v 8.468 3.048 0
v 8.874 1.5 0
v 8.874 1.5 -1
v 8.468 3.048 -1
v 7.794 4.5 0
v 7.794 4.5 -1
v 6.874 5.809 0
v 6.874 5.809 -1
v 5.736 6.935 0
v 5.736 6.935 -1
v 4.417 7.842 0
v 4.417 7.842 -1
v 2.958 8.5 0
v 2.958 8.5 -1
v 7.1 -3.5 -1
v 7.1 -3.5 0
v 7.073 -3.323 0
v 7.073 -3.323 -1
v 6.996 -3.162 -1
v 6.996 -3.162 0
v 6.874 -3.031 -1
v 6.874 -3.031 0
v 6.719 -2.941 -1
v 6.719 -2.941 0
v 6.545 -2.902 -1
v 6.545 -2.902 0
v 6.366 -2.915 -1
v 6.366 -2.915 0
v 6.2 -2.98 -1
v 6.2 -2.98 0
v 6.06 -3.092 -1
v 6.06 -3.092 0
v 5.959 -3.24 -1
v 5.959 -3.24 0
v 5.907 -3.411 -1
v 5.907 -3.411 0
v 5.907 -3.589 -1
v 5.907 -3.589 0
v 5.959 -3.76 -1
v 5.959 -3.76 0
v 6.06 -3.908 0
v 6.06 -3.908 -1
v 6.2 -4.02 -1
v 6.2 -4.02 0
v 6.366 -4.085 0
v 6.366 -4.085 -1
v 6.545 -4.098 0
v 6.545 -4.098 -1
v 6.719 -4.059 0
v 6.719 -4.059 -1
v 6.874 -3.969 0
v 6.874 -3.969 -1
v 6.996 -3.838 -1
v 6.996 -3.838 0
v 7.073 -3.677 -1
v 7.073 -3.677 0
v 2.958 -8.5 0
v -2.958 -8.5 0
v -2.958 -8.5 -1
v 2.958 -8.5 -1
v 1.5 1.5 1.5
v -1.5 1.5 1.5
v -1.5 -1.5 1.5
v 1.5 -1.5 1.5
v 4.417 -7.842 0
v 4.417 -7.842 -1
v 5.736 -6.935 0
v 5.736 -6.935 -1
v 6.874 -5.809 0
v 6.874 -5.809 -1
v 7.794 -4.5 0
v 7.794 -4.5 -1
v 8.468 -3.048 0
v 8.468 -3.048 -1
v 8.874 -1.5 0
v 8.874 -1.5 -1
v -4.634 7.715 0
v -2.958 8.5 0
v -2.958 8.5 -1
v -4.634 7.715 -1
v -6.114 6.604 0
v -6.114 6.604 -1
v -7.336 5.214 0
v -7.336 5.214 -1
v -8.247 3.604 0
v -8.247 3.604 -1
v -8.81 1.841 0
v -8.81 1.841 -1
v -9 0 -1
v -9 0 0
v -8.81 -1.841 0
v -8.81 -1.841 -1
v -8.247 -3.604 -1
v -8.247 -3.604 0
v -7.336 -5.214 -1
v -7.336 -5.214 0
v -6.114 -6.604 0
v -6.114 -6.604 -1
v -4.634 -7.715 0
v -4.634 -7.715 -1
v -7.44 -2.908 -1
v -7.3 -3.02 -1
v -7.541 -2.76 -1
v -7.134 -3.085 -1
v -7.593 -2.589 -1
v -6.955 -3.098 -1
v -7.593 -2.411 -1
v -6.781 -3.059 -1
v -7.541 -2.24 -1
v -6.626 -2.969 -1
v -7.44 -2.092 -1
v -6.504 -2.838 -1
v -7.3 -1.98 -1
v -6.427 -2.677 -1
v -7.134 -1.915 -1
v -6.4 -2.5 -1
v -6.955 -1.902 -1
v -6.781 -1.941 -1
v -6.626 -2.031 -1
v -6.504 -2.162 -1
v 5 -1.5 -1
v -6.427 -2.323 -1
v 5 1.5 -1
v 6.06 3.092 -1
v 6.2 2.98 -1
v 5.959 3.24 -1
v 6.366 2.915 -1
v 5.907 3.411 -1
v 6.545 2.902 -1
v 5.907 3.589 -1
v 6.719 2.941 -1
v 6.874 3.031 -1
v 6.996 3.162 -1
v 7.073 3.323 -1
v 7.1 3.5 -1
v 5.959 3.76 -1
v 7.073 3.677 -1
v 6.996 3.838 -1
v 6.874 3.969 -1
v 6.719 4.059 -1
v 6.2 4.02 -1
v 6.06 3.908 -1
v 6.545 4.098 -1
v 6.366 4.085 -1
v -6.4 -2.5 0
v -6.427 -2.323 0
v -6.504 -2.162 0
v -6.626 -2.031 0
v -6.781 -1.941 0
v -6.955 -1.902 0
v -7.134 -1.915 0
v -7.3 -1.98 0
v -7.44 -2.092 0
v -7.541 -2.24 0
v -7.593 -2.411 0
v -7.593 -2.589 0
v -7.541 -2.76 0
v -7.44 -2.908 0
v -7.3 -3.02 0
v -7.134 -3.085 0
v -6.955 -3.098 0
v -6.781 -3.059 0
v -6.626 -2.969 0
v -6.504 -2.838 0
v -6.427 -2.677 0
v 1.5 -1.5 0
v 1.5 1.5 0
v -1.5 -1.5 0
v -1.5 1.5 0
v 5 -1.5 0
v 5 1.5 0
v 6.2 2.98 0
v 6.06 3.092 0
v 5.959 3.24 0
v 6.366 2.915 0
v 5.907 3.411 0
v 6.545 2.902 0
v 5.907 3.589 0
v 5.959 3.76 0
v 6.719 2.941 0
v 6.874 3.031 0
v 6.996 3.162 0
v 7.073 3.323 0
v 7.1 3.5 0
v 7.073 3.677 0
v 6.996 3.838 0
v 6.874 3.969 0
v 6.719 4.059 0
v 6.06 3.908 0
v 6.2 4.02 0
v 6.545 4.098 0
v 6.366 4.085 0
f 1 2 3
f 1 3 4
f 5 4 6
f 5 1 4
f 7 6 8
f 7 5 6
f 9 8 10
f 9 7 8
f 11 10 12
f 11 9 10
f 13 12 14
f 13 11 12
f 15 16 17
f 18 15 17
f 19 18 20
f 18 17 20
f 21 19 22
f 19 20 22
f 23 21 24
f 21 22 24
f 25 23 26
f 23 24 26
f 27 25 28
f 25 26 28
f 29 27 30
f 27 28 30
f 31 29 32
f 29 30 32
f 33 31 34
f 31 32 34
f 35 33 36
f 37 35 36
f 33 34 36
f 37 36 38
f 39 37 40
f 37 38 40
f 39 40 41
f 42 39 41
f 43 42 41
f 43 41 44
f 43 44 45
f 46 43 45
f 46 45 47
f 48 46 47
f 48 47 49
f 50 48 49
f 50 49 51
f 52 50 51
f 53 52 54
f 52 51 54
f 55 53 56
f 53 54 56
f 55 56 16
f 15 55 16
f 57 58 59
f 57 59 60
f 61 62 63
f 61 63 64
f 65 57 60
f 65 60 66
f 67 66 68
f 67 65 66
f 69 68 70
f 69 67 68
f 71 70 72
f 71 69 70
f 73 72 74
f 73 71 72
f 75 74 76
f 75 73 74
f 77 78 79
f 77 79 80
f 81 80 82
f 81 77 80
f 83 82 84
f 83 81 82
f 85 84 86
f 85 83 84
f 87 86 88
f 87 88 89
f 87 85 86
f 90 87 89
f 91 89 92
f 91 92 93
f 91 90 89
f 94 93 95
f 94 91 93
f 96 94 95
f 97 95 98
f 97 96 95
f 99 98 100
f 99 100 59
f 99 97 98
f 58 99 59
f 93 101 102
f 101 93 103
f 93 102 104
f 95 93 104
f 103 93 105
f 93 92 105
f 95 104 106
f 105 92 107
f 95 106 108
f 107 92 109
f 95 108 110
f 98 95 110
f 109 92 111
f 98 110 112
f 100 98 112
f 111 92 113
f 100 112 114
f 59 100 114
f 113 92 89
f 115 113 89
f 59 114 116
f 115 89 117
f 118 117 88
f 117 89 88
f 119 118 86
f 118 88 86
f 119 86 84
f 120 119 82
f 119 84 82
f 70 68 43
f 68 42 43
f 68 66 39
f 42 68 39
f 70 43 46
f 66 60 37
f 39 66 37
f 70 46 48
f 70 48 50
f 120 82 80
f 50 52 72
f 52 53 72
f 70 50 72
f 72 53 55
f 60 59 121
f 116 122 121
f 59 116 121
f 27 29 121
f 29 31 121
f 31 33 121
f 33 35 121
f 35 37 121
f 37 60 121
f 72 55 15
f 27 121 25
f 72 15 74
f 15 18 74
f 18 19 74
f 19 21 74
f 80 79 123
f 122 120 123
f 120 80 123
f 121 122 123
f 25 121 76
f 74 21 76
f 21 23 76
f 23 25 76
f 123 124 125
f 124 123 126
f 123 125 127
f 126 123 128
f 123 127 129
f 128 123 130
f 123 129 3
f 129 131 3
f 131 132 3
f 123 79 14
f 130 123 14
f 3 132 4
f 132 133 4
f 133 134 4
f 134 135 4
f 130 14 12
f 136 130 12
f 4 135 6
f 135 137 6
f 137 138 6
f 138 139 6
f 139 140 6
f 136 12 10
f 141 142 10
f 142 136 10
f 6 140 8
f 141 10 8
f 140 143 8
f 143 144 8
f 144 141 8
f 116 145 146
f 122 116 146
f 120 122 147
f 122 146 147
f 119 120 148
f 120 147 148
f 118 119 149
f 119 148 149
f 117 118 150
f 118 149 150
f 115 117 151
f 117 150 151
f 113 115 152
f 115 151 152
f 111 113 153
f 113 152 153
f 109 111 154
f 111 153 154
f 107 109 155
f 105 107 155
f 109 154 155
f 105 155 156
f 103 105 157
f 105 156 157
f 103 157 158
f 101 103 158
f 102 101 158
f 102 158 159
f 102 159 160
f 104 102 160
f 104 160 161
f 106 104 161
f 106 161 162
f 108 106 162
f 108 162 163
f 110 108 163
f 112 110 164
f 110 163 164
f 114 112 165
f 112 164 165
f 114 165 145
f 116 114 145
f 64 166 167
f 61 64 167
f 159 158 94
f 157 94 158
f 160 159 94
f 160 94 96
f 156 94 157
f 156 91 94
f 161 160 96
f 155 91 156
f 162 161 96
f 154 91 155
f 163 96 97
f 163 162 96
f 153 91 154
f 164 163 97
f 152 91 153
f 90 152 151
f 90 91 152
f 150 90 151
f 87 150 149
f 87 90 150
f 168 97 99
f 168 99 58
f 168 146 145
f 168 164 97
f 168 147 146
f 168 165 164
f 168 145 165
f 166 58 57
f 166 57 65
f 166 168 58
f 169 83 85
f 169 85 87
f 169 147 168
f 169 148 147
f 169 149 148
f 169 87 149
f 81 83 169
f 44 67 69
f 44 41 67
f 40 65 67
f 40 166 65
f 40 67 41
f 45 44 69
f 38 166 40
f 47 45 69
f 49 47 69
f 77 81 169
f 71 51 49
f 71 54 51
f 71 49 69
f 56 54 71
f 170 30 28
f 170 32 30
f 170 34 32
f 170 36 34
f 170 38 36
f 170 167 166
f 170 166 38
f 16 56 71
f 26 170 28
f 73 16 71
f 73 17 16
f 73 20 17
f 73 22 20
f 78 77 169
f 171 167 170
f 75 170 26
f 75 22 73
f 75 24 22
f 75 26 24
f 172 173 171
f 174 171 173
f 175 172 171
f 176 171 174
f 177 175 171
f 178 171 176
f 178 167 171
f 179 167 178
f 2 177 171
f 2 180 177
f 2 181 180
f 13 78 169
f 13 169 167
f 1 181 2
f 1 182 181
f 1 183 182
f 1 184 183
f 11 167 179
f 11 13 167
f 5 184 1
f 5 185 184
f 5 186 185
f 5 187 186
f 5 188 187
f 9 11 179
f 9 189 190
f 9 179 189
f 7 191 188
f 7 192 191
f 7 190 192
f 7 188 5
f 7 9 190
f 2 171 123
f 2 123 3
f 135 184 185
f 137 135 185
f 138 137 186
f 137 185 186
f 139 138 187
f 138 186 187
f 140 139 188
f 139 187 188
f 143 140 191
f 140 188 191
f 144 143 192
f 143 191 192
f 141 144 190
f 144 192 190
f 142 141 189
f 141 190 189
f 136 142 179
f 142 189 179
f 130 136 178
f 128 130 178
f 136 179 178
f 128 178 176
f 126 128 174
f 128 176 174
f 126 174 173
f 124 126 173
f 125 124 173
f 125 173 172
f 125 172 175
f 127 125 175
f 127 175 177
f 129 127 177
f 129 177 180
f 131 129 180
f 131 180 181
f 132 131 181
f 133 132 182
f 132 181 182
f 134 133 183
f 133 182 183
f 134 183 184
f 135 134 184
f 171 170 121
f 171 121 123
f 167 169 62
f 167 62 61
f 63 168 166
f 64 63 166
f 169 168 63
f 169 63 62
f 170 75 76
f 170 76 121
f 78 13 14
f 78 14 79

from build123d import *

# Parameters (mm, degrees)
SKETCH_1_R      = 0.6
EXTRUDE_1_DEPTH = 1
SKETCH_1_3_W    = 3
SKETCH_1_3_H    = 3
EXTRUDE_2_DEPTH = 1.5


with BuildPart() as part:
    # Sketch 1 → Extrude 1 (new body)
    with BuildSketch(Plane.XY):
        with BuildLine():
            Line((5, -1.5), (5, 1.5))
            Line((5, 1.5), (8.874119675, 1.5))
            ThreePointArc((8.874119675, 1.5), (6.873863542, 5.809475019), (2.958039892, 8.5))
            Line((2.958039892, 8.5), (-2.958039892, 8.5))
            ThreePointArc((-2.958039892, 8.5), (-9, 0), (-2.958039892, -8.5))
            Line((-2.958039892, -8.5), (2.958039892, -8.5))
            ThreePointArc((2.958039892, -8.5), (6.873863542, -5.809475019), (8.874119675, -1.5))
            Line((8.874119675, -1.5), (5, -1.5))
        make_face()
        with Locations((-7, -2.5)):
            Circle(SKETCH_1_R, mode=Mode.SUBTRACT)
        with Locations((6.5, -3.5)):
            Circle(SKETCH_1_R, mode=Mode.SUBTRACT)
        with Locations((6.5, 3.5)):
            Circle(SKETCH_1_R, mode=Mode.SUBTRACT)
    extrude(amount=-EXTRUDE_1_DEPTH)

    # Sketch 1_3 → Extrude 2 (add)
    with BuildSketch(Plane.XY):
        Rectangle(SKETCH_1_3_W, SKETCH_1_3_H)
    extrude(amount=EXTRUDE_2_DEPTH)


solid = part.part
